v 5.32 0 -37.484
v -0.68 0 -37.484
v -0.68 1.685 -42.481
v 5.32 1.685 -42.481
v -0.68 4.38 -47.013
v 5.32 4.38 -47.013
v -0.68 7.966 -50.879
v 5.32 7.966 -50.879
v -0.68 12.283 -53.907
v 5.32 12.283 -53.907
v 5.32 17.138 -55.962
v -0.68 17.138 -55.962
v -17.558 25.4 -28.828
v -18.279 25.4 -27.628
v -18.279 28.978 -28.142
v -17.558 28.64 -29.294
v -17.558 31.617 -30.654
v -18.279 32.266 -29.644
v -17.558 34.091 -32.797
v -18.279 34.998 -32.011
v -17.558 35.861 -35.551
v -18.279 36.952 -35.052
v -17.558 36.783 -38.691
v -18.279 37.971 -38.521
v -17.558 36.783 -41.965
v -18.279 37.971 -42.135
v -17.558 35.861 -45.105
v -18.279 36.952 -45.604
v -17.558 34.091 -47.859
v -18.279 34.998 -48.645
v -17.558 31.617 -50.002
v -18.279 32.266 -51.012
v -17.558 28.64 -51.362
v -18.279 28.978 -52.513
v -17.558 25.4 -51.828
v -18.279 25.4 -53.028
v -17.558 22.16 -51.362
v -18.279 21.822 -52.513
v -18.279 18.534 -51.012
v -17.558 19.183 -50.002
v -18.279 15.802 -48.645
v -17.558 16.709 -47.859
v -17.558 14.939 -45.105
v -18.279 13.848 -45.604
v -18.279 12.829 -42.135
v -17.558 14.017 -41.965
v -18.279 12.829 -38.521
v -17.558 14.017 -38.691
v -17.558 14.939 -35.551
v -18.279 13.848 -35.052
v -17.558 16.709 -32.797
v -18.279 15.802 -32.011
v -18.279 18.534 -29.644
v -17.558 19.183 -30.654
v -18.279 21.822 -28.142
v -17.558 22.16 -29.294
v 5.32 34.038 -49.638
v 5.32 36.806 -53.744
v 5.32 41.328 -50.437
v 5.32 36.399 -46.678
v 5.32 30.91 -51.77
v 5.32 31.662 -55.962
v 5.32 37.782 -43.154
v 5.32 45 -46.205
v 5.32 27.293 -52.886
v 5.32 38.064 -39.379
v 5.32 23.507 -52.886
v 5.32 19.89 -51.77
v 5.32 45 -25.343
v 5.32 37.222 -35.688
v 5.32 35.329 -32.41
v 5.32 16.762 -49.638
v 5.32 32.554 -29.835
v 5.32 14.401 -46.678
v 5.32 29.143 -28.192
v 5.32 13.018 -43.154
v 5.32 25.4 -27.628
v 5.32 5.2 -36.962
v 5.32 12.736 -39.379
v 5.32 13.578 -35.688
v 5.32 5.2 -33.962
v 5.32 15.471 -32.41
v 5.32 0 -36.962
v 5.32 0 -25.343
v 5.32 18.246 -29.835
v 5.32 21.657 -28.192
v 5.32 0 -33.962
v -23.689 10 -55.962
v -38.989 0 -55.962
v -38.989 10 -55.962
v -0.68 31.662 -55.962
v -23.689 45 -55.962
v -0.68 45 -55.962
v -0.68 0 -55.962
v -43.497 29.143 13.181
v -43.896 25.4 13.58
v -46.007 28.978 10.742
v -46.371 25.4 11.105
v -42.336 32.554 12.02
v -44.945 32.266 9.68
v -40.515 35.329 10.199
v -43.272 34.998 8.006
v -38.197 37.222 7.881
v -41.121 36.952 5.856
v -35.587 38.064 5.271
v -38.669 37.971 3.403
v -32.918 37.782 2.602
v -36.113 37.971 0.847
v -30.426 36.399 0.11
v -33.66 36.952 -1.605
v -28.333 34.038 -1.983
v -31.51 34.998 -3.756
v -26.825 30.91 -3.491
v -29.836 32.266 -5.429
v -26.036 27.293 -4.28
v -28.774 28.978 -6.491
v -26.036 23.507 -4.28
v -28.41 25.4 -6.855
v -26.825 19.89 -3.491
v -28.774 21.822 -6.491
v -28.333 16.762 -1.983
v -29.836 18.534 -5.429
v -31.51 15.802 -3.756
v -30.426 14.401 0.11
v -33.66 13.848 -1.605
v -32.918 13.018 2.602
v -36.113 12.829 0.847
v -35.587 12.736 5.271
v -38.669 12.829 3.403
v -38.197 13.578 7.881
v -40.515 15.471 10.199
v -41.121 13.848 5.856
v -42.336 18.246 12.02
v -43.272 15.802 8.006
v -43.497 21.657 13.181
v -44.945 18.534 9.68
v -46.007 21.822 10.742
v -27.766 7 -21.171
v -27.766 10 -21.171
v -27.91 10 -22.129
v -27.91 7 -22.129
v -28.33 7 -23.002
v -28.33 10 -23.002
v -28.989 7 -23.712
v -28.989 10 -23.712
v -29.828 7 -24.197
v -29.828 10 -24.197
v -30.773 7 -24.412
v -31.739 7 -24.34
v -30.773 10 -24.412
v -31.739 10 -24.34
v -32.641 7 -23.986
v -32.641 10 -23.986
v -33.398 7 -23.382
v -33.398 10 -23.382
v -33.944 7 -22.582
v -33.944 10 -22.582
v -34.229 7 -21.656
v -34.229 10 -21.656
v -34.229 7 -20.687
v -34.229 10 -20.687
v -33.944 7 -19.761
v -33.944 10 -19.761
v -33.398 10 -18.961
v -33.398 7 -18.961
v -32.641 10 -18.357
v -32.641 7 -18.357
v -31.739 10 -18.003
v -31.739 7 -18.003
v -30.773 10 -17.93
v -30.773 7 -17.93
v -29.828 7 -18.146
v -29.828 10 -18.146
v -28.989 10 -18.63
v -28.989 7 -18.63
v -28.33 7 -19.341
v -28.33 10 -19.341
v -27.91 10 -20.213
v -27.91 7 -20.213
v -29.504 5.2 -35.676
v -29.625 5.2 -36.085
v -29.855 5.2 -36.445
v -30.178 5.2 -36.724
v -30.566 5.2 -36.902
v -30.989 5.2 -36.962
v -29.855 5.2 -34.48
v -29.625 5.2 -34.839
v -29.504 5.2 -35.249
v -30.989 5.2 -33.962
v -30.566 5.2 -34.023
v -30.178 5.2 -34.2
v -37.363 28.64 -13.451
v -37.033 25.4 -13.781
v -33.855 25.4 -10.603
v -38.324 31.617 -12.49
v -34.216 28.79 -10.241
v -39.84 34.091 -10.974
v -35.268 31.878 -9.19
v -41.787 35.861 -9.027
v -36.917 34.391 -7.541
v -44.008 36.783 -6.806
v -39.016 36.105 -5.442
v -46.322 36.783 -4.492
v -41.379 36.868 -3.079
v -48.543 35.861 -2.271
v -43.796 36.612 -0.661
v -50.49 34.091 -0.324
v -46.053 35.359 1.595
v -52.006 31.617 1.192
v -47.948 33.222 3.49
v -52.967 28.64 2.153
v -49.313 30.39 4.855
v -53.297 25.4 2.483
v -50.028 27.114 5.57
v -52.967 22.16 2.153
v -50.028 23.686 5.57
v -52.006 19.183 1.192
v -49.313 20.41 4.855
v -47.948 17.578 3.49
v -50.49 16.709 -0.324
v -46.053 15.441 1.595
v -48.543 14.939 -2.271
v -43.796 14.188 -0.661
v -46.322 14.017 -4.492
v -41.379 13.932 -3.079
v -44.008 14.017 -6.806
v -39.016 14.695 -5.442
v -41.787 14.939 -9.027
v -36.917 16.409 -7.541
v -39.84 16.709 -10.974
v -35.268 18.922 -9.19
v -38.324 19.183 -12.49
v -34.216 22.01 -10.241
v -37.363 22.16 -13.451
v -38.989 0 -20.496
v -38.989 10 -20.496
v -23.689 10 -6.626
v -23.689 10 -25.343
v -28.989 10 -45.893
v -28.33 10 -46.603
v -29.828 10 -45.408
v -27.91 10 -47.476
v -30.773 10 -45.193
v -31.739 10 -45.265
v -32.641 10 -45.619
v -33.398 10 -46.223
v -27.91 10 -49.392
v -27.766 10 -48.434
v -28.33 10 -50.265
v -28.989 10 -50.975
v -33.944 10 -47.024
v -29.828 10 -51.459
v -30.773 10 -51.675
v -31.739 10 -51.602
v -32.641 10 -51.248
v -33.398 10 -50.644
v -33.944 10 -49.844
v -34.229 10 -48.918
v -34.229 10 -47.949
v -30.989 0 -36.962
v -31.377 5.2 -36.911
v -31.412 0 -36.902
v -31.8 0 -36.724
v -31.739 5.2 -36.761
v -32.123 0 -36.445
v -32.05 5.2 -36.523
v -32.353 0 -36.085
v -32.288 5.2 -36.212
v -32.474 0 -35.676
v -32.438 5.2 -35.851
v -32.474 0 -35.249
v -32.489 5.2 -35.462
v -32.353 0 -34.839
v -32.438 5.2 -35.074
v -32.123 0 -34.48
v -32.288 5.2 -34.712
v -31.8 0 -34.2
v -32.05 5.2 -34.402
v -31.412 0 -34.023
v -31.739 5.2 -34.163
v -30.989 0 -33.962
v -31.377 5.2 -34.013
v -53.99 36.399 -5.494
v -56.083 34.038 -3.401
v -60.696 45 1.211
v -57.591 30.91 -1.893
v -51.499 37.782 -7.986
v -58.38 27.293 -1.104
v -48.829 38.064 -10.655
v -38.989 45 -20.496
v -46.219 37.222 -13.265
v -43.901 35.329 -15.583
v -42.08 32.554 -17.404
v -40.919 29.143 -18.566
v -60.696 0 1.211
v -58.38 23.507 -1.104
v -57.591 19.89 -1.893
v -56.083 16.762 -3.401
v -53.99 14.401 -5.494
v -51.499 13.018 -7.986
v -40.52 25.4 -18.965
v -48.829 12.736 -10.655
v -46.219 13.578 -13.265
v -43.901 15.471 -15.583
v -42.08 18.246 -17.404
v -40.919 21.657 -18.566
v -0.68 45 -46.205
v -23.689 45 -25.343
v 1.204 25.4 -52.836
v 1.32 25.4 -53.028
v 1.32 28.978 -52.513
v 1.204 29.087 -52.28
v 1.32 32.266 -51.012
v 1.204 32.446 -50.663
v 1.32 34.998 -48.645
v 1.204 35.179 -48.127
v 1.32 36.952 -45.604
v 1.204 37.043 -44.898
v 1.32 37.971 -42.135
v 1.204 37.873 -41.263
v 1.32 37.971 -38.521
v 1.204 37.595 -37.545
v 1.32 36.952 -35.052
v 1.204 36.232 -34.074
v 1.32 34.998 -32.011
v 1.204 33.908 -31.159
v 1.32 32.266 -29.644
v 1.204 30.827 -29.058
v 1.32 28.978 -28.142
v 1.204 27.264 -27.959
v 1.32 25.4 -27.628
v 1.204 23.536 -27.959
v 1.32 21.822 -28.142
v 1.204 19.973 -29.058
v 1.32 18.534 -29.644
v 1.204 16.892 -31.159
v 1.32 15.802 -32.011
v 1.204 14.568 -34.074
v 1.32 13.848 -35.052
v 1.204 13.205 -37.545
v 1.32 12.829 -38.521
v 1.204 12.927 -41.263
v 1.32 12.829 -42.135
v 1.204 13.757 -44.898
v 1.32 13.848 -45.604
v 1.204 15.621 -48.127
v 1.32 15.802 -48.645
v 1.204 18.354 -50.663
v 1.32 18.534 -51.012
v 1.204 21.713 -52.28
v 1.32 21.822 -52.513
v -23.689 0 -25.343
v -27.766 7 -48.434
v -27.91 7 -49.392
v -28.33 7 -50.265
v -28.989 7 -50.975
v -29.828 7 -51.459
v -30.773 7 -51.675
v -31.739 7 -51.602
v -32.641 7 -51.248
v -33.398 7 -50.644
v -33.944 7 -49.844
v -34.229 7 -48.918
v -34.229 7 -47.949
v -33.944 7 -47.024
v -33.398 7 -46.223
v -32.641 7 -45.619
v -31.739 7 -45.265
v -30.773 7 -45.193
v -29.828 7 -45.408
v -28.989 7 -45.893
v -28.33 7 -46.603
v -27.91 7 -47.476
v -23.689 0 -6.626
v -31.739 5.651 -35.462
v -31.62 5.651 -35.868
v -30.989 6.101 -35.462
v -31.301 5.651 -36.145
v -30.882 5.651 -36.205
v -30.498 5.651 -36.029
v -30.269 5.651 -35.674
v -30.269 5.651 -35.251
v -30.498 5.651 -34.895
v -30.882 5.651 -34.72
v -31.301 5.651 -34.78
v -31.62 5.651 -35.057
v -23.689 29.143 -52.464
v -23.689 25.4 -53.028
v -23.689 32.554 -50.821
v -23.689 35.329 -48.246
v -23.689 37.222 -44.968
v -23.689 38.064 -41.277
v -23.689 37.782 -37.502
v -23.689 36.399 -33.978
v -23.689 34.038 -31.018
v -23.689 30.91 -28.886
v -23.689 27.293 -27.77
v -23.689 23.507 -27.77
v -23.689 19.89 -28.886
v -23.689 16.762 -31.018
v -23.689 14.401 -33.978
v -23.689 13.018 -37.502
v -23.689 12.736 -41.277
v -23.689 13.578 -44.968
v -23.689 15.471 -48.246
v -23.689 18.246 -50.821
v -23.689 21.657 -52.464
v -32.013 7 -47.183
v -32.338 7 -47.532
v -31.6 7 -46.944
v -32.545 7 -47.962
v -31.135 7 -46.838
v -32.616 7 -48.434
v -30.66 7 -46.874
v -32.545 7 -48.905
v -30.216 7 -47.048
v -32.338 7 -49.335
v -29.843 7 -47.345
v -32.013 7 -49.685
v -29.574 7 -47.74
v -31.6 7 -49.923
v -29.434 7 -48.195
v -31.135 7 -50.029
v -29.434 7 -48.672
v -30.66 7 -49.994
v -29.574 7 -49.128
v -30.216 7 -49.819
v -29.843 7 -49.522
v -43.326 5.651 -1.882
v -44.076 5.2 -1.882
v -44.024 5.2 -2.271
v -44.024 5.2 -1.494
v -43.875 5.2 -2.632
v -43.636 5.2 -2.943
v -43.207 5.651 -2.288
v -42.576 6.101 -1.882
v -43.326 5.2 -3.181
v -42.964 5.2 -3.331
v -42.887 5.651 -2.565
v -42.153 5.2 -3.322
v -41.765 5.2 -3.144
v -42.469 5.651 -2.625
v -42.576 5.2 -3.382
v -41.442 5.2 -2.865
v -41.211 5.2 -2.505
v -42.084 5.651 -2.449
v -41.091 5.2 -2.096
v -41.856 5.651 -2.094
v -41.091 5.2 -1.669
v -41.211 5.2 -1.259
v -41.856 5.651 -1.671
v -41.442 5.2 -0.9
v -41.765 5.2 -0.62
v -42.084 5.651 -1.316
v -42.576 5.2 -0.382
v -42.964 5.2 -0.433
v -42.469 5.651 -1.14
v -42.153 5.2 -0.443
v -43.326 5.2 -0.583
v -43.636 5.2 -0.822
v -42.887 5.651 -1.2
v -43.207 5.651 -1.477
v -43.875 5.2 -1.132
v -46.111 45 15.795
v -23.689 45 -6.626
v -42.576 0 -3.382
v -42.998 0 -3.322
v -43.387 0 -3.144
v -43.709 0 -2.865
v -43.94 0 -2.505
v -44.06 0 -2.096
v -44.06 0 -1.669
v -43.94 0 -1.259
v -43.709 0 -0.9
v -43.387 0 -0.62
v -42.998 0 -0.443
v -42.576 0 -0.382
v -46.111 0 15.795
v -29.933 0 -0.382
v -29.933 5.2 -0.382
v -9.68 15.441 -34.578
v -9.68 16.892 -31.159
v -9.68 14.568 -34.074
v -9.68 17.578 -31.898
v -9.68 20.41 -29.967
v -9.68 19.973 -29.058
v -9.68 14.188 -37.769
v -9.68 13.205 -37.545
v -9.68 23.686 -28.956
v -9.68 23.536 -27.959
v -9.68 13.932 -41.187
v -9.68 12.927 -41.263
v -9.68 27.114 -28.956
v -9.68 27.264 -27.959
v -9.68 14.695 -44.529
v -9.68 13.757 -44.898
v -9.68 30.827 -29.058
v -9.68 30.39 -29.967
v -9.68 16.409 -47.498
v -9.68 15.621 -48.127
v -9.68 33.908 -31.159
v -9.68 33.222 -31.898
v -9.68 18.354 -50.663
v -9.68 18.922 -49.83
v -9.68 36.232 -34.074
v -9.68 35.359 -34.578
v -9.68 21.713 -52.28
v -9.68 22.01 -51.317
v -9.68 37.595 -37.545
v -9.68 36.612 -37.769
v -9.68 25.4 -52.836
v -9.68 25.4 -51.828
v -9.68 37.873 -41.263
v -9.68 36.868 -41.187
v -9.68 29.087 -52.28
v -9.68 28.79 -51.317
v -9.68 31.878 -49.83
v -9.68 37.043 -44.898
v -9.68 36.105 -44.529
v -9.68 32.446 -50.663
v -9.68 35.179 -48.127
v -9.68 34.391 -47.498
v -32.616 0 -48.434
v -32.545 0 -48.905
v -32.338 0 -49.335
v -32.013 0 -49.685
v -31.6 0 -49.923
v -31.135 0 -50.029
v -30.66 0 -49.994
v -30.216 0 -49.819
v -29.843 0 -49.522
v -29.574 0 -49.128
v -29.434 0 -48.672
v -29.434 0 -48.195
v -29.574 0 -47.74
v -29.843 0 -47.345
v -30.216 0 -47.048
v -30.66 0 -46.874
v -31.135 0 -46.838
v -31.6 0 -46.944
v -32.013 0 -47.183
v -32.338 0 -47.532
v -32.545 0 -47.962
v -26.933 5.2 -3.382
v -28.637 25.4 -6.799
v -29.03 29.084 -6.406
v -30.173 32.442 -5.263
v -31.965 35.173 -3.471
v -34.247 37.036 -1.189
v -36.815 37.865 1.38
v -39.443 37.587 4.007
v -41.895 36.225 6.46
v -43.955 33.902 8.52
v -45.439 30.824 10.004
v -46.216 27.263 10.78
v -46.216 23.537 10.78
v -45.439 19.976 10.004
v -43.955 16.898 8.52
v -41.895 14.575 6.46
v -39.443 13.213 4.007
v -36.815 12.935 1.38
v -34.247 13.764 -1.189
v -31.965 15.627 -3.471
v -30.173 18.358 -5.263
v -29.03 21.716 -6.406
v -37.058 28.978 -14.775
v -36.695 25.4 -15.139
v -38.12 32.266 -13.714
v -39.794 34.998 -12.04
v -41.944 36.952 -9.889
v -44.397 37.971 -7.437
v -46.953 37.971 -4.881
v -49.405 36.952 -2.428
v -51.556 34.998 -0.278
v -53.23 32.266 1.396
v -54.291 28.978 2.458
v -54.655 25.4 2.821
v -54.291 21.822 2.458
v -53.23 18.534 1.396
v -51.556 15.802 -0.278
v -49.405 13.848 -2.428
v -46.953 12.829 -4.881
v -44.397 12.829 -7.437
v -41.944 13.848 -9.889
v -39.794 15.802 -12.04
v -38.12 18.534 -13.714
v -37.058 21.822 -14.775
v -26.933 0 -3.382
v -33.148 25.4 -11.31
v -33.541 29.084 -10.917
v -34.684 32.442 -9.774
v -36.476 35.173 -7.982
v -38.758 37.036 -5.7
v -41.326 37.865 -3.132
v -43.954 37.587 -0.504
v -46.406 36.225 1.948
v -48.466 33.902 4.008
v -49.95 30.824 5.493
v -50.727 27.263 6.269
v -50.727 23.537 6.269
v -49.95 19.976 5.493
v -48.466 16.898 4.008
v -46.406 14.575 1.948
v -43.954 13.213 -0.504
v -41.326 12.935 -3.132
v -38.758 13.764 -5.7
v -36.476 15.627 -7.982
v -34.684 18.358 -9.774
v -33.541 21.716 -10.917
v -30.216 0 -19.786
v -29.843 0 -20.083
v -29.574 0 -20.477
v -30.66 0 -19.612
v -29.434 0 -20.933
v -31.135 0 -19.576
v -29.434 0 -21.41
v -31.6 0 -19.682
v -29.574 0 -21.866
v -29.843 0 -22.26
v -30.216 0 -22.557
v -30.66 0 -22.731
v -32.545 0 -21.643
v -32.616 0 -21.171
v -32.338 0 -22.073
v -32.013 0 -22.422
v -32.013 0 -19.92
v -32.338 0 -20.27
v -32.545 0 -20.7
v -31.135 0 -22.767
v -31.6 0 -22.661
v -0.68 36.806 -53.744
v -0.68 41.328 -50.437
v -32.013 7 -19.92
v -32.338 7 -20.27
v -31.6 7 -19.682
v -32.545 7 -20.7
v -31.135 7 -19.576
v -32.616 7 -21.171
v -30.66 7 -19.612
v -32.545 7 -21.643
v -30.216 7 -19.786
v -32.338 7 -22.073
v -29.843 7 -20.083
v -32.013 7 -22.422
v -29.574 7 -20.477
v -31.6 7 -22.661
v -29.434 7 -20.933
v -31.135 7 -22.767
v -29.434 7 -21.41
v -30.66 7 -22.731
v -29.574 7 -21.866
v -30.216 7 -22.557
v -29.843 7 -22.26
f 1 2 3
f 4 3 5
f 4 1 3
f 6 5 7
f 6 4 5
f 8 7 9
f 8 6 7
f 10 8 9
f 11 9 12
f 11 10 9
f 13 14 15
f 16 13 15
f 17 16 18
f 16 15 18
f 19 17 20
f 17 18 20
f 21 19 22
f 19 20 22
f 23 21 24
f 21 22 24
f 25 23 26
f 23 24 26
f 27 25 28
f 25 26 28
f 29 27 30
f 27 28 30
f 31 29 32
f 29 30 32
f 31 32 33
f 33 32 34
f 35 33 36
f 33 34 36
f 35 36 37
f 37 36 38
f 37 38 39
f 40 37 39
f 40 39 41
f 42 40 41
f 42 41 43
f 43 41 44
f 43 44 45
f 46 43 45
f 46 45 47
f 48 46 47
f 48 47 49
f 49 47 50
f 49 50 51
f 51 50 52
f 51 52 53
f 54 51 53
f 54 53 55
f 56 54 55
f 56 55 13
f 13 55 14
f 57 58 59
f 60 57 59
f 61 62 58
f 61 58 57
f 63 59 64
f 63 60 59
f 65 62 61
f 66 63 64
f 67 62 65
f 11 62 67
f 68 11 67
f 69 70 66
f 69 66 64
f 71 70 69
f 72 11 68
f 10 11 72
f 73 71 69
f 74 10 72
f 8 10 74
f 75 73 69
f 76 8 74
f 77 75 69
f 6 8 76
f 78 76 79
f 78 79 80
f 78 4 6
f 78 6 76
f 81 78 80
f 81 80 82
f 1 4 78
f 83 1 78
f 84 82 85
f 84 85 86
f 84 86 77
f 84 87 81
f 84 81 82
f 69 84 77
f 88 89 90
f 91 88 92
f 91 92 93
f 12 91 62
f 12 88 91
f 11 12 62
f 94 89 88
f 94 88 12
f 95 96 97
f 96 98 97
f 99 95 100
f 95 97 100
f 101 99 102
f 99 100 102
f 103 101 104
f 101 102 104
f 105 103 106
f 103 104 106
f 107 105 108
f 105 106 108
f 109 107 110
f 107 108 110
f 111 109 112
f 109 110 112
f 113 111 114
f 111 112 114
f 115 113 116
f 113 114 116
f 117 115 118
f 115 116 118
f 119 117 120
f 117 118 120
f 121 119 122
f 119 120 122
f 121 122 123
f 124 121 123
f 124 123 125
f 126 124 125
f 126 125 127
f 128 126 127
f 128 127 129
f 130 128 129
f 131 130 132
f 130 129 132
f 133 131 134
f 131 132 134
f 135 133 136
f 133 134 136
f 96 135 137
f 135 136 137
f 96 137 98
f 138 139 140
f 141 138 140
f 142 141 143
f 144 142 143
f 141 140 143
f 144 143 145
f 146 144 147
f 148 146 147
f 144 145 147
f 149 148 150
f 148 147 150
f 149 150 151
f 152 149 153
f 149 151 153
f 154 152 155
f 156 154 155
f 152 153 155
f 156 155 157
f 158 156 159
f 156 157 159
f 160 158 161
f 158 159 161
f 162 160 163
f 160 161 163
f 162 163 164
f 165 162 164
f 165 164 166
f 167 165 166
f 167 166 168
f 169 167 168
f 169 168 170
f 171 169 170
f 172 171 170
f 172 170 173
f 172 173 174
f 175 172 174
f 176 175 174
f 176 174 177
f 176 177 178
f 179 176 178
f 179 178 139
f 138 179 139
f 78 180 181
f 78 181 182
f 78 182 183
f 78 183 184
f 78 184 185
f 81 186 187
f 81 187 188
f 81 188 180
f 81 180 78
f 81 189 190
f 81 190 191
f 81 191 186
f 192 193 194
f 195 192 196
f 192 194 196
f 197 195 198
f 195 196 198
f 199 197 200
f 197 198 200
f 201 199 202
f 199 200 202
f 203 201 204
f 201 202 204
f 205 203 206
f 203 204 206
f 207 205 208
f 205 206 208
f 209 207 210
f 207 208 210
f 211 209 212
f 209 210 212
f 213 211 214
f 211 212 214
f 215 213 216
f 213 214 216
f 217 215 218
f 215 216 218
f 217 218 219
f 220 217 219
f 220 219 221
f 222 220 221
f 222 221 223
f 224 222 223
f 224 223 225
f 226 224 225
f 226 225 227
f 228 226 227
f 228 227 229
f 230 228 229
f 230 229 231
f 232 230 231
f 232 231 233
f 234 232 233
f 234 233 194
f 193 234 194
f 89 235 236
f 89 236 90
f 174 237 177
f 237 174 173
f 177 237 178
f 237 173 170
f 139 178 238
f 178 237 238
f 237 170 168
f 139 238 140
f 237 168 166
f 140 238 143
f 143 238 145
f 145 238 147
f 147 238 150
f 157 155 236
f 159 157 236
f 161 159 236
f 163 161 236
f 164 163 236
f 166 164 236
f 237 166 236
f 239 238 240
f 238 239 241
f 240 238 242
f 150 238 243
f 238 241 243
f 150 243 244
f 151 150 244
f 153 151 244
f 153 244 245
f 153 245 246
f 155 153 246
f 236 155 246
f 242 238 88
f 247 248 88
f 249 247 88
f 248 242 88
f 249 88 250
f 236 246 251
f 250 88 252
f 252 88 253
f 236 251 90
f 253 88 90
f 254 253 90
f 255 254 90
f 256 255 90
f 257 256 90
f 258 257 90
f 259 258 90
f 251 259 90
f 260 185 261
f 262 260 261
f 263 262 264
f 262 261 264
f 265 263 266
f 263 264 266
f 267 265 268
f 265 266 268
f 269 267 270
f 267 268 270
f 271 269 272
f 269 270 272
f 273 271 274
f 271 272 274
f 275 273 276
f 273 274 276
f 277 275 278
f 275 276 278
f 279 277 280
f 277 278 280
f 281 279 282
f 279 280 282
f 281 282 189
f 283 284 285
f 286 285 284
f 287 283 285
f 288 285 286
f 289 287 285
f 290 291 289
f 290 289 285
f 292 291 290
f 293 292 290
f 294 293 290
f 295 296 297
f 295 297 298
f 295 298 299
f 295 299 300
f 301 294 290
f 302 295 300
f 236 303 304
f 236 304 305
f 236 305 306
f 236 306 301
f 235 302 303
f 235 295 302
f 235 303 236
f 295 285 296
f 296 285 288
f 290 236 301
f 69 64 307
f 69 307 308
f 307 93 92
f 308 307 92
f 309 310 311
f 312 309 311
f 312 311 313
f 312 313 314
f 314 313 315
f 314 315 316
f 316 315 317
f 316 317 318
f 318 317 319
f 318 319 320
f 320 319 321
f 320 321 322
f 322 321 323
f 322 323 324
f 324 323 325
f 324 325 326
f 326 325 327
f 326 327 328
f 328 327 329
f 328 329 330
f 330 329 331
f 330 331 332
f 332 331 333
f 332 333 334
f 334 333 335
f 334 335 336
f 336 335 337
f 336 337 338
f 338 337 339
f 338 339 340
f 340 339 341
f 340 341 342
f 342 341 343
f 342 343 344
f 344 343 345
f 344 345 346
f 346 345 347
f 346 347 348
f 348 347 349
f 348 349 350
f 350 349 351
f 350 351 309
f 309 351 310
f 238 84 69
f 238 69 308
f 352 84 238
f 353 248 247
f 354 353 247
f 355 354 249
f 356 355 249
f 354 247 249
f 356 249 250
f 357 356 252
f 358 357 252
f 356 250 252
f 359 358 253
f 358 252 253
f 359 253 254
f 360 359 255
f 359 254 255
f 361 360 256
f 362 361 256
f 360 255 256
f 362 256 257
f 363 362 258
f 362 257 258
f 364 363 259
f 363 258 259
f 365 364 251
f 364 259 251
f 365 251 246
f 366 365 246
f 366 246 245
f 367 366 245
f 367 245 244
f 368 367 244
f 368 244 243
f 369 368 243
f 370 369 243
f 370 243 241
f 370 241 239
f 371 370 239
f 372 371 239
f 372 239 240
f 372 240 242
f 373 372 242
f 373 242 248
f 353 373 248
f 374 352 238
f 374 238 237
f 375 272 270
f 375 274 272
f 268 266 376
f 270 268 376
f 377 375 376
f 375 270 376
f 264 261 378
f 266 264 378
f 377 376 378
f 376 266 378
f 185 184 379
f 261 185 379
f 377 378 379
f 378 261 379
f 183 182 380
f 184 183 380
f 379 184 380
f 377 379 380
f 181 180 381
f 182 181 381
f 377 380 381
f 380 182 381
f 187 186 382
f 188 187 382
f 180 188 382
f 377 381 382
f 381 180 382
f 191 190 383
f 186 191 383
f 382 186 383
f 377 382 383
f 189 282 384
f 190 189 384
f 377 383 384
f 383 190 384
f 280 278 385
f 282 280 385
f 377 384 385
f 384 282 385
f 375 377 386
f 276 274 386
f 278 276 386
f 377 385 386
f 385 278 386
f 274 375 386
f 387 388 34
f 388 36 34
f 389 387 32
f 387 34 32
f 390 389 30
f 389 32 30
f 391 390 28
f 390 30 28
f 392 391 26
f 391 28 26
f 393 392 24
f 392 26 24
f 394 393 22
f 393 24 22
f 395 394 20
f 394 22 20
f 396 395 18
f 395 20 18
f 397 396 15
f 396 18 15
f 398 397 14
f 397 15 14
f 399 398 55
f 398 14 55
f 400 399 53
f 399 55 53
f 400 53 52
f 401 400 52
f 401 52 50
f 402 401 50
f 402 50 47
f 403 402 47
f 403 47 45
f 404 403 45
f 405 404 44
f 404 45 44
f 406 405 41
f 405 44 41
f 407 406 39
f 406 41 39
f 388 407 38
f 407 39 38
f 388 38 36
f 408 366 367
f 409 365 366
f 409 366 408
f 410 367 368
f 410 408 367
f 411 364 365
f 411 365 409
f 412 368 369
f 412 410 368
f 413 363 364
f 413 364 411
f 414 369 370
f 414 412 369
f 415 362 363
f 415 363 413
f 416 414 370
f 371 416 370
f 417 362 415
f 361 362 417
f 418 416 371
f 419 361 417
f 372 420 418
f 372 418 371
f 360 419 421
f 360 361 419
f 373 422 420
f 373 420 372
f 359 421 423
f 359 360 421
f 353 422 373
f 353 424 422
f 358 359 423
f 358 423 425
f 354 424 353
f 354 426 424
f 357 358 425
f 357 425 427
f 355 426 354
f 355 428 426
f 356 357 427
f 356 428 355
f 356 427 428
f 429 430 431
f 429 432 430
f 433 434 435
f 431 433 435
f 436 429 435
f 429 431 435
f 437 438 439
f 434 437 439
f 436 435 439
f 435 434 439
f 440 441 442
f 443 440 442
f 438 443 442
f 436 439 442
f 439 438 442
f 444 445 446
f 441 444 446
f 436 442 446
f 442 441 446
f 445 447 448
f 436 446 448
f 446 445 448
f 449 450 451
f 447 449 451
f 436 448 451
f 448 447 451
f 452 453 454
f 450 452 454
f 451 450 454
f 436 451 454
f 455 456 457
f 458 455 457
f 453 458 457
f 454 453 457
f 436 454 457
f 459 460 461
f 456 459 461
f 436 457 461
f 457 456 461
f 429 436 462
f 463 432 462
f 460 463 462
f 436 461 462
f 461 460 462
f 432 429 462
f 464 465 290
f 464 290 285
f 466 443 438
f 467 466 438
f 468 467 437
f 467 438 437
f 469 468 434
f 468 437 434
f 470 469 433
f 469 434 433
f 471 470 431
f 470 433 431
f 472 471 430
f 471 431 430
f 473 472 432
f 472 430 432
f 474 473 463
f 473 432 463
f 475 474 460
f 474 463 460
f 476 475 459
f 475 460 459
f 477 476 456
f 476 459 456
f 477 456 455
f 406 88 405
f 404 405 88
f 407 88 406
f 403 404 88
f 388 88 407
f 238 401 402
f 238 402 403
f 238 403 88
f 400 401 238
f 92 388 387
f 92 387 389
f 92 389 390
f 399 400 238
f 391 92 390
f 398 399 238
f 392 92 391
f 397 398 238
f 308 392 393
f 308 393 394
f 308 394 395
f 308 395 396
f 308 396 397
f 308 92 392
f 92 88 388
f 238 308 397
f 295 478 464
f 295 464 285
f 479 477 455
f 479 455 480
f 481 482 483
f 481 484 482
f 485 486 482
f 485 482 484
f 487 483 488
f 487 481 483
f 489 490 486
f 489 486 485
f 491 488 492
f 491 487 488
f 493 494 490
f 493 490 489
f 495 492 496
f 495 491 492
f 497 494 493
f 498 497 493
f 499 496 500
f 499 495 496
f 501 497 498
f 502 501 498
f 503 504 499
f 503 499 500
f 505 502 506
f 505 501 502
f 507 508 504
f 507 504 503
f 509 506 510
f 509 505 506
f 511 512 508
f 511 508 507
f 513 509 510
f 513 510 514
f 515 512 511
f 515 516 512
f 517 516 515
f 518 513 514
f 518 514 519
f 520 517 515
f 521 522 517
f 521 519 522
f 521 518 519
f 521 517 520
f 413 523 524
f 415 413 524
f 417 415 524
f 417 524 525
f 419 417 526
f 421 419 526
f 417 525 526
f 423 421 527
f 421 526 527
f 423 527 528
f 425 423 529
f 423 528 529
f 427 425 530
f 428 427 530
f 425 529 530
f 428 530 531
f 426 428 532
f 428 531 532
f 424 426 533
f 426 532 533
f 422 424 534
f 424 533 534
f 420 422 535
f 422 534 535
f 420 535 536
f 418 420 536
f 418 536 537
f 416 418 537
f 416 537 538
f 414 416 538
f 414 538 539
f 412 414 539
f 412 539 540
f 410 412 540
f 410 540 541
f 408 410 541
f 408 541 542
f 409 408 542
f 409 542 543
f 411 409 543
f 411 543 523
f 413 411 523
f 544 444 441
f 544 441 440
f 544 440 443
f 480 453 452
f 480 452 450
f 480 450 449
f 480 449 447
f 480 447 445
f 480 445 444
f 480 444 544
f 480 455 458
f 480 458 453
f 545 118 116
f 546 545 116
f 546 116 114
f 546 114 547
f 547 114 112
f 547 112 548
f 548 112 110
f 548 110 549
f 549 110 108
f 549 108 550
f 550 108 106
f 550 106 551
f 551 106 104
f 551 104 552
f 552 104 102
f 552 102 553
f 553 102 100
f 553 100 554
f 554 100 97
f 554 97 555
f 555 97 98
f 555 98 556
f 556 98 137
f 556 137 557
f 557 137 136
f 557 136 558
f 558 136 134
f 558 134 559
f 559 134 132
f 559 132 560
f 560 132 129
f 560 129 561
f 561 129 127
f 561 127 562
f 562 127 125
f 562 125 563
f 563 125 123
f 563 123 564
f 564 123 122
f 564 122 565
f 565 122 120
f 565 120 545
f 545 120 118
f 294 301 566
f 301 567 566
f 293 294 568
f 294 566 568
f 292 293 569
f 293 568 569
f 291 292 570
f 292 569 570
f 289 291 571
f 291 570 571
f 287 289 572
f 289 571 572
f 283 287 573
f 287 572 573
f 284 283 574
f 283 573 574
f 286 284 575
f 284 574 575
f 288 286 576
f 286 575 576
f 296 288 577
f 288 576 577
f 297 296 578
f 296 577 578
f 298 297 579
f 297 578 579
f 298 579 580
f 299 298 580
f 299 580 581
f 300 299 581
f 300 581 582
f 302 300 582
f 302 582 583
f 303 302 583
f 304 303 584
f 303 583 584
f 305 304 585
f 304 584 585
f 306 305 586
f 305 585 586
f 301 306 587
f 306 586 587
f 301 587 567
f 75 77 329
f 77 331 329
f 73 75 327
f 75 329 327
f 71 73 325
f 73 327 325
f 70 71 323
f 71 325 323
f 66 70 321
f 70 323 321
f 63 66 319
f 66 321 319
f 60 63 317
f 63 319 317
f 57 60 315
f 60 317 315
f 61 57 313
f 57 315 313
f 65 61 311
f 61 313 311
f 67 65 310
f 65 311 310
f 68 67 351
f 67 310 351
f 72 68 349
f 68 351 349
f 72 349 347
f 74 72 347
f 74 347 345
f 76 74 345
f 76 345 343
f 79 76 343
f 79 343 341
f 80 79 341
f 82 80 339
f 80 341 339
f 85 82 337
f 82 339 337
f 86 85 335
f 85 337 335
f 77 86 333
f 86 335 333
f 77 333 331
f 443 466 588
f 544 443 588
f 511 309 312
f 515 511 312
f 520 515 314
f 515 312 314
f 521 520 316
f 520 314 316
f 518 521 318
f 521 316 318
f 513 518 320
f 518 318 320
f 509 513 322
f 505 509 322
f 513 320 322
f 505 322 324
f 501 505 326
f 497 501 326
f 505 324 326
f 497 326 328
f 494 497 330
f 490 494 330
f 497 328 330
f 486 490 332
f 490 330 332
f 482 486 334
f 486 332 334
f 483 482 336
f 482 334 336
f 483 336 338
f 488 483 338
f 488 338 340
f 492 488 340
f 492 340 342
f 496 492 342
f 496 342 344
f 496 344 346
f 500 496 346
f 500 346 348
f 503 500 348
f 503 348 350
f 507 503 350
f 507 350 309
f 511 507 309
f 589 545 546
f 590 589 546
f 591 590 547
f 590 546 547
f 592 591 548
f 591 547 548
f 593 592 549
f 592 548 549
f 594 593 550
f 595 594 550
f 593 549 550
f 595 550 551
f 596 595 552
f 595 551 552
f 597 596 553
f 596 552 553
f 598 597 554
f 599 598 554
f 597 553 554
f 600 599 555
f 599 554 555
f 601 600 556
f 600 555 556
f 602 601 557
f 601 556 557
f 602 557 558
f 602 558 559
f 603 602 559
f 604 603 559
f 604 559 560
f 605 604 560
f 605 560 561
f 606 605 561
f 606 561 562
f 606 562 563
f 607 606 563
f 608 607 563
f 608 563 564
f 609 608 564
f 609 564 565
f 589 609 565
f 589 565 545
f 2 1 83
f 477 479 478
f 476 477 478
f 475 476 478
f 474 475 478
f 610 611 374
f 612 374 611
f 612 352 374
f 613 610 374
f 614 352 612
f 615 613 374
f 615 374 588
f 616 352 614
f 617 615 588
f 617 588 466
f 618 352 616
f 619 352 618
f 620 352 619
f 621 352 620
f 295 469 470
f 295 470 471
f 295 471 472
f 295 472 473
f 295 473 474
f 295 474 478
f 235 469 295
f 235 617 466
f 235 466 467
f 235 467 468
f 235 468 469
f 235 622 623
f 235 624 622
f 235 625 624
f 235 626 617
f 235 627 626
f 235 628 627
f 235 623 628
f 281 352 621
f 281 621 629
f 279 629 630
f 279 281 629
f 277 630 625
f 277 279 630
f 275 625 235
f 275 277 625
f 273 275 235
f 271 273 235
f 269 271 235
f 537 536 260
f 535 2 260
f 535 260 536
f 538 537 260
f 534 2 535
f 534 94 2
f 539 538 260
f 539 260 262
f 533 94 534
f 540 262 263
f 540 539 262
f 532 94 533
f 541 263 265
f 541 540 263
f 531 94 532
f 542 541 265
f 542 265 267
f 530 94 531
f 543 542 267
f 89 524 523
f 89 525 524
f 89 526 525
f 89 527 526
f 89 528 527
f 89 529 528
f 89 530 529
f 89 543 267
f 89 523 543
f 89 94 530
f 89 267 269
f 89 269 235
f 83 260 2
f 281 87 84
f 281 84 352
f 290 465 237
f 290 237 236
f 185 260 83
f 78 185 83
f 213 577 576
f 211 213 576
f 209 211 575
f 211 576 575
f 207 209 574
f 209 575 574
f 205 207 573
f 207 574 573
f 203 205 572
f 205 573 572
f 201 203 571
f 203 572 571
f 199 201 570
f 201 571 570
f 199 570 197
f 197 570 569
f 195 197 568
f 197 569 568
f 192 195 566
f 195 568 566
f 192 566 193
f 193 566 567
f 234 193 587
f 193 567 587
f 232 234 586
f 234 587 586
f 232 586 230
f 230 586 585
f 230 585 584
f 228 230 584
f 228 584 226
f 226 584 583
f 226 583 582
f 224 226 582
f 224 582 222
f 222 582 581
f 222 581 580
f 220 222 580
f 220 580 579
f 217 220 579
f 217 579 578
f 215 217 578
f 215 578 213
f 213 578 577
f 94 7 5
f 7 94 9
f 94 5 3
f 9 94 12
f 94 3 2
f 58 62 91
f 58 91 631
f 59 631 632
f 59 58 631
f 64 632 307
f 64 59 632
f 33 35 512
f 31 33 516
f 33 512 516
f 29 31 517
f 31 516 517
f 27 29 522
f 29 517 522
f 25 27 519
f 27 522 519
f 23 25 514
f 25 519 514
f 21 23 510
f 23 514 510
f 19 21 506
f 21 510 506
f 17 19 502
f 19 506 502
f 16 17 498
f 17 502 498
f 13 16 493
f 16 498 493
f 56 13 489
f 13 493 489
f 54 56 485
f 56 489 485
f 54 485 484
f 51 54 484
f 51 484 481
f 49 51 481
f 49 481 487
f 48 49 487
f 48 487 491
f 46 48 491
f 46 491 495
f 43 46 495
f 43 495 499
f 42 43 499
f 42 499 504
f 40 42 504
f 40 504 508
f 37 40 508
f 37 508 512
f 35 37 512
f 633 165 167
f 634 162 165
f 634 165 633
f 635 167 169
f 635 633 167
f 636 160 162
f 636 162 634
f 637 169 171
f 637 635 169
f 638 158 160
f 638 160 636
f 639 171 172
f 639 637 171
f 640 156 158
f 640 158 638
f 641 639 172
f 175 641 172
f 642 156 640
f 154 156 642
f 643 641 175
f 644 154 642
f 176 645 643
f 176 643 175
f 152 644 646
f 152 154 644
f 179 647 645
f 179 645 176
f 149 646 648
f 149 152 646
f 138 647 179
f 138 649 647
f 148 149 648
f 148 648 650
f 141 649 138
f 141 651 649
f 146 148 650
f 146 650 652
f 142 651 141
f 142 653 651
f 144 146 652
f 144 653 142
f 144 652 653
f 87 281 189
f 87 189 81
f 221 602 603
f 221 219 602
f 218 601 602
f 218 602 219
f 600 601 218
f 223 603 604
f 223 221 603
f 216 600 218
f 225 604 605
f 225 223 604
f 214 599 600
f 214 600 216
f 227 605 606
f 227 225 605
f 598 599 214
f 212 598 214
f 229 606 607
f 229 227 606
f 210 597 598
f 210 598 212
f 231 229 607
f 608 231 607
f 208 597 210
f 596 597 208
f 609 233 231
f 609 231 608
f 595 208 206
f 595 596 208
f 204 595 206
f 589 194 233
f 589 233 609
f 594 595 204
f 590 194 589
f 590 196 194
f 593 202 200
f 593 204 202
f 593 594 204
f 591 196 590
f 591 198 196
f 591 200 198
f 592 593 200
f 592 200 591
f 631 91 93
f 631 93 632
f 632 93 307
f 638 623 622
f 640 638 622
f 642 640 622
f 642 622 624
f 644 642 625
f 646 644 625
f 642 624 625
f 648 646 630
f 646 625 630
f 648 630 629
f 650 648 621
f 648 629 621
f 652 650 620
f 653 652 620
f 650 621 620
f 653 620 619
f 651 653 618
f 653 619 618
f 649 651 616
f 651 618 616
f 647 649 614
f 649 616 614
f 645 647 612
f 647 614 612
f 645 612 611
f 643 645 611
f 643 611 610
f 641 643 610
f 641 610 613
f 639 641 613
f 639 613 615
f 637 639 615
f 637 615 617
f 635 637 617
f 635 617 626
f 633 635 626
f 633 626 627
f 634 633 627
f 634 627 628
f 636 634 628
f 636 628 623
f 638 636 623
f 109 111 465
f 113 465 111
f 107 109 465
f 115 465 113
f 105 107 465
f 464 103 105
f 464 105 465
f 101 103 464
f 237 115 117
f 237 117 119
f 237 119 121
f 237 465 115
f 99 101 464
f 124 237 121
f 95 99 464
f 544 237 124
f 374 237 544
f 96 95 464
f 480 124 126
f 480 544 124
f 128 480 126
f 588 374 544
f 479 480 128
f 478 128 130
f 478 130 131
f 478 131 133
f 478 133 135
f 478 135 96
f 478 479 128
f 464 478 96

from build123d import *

# Parameters (mm, degrees)
BOSS_EXTRUDE1_DEPTH            = 45
SKETCH2_R                      = 12.5
CUT_EXTRUDE1_DEPTH             = 10
SKETCH3_R                      = 12.508139694
CUT_EXTRUDE2_DEPTH             = 15
CUT_EXTRUDE3_REACH             = 53.053
SKETCH4_R                      = 11.5
CUT_EXTRUDE4_REACH             = 53.015
SKETCH5_R                      = 11.5
SM1_TAPPED_HOLE1_D             = 25.4
SM1_TAPPED_HOLE1_DEPTH         = 4
SM1_TAPPED_HOLE1_TIP           = 7.630929862
SM1_TAPPED_HOLE2_D             = 25.4
SM1_TAPPED_HOLE2_DEPTH         = 3.5
SM1_TAPPED_HOLE2_TIP           = 7.630929862
CUT_EXTRUDE5_DEPTH             = 35
SM1_TAPPED_HOLE3_D             = 25.4
SM1_TAPPED_HOLE3_DEPTH         = 5.41
SM1_TAPPED_HOLE3_TIP           = 7.630929862
SM1_TAPPED_HOLE4_D             = 25.4
SM1_TAPPED_HOLE4_DEPTH         = 5.41
SM1_TAPPED_HOLE4_TIP           = 7.630929862
CBORE_FOR_M3_SHCS1_D           = 3.2
CBORE_FOR_M3_SHCS1_DEPTH       = 10
CBORE_FOR_M3_SHCS1_CBORE_D     = 6.5
CBORE_FOR_M3_SHCS1_CBORE_DEPTH = 3
CUT_EXTRUDE6_START             = -5.339235
CUT_EXTRUDE6_DEPTH             = 6
F_3_0MM_DOWEL_HOLE1_D          = 3
F_3_0MM_DOWEL_HOLE1_DEPTH      = 5.2
F_3_0MM_DOWEL_HOLE1_TIP        = 0.901290929
SKETCH21_W                     = 17.451379617
SKETCH21_H                     = 3
SKETCH21_W_2                   = 37.142162435
CUT_EXTRUDE7_DEPTH             = 5.2


with BuildPart() as part:
    # Sketch1 → Boss-Extrude1 (new body)
    with BuildSketch(Plane(origin=(0, 0, 0), x_dir=(1, 0, 0), z_dir=(0, 1, 0))):
        Polygon((5.319745859, 25.342678723), (-23.689372123, 25.342678723), (-23.689372123, 6.626389833), (-46.111095982, -15.795334027), (-60.695537468, -1.210892541), (-38.989042082, 20.495602845), (-38.989042082, 55.962281461), (5.319745859, 55.962281461), align=None)
    extrude(amount=BOSS_EXTRUDE1_DEPTH)

    # Sketch2 → Cut-Extrude1 (cut)
    with BuildSketch(Plane(origin=(-15.157880978, 0, -15.157880978), x_dir=(0.707106781, 0, -0.707106781), z_dir=(0.707106781, 0, 0.707106781))):
        with Locations((-27.941994438, 25.4)):
            Circle(SKETCH2_R)
    extrude(amount=-CUT_EXTRUDE1_DEPTH, mode=Mode.SUBTRACT)

    # Sketch3 → Cut-Extrude2 (cut)
    with BuildSketch(Plane(origin=(5.319745859, 0, 0), x_dir=(0, 0, -1), z_dir=(1, 0, 0))):
        with Locations((40.327918955, 25.4)):
            Circle(SKETCH3_R)
    extrude(amount=-CUT_EXTRUDE2_DEPTH, mode=Mode.SUBTRACT)

    # Sketch4 → Cut-Extrude3 (cut, up to next)
    with BuildSketch(Plane(origin=(-22.228948789, 0, -22.228948789), x_dir=(0.707106781, 0, -0.707106781), z_dir=(0.707106781, 0, 0.707106781)), mode=Mode.PRIVATE) as cut_extrude3_sk1:
        with Locations((-27.941994438, 25.4)):
            Circle(SKETCH4_R)
    cut_extrude3_tool1 = extrude(cut_extrude3_sk1.sketch, amount=-CUT_EXTRUDE3_REACH, mode=Mode.PRIVATE) & part.part
    add(cut_extrude3_tool1.solids().sort_by_distance((-41.986923, 25.4, -2.470975))[0], mode=Mode.SUBTRACT)

    # Sketch5 → Cut-Extrude4 (cut, up to next)
    with BuildSketch(Plane(origin=(-9.680254141, 0, 0), x_dir=(0, 0, -1), z_dir=(1, 0, 0)), mode=Mode.PRIVATE) as cut_extrude4_sk1:
        with Locations((40.327918955, 25.4)):
            Circle(SKETCH5_R)
    cut_extrude4_tool1 = extrude(cut_extrude4_sk1.sketch, amount=-CUT_EXTRUDE4_REACH, mode=Mode.PRIVATE) & part.part
    add(cut_extrude4_tool1.solids().sort_by_distance((-9.680254, 25.4, -40.327919))[0], mode=Mode.SUBTRACT)

    # SM1 Tapped Hole1
    with Locations(Plane(origin=(5.319745859, 0, 0), x_dir=(0, 0, -1), z_dir=(1, 0, 0))):
        with Locations((40.327918955, 25.4)):
            Hole(SM1_TAPPED_HOLE1_D / 2, depth=SM1_TAPPED_HOLE1_DEPTH)
            with Locations((0, 0, -(SM1_TAPPED_HOLE1_DEPTH + SM1_TAPPED_HOLE1_TIP / 2))):  # 118° drill point
                Cone(0, SM1_TAPPED_HOLE1_D / 2, SM1_TAPPED_HOLE1_TIP, mode=Mode.SUBTRACT)

    # SM1 Tapped Hole2
    with Locations(Plane(origin=(-15.157880978, 0, -15.157880978), x_dir=(0.707106781, 0, -0.707106781), z_dir=(0.707106781, 0, 0.707106781))):
        with Locations((-27.941994438, 25.4)):
            Hole(SM1_TAPPED_HOLE2_D / 2, depth=SM1_TAPPED_HOLE2_DEPTH)
            with Locations((0, 0, -(SM1_TAPPED_HOLE2_DEPTH + SM1_TAPPED_HOLE2_TIP / 2))):  # 118° drill point
                Cone(0, SM1_TAPPED_HOLE2_D / 2, SM1_TAPPED_HOLE2_TIP, mode=Mode.SUBTRACT)

    # Sketch11 → Cut-Extrude5 (cut)
    with BuildSketch(Plane(origin=(0, 45, 0), x_dir=(1, 0, 0), z_dir=(0, 1, 0))):
        Polygon((-23.689372123, 6.626389833), (-38.989042082, 20.495602845), (-38.989042082, 55.962281461), (-23.689372123, 55.962281461), align=None)
    extrude(amount=-CUT_EXTRUDE5_DEPTH, mode=Mode.SUBTRACT)

    # SM1 Tapped Hole3
    with Locations(Plane.ZY.offset(23.689372123)):
        with Locations((-40.327918955, 25.4)):
            Hole(SM1_TAPPED_HOLE3_D / 2, depth=SM1_TAPPED_HOLE3_DEPTH)
            with Locations((0, 0, -(SM1_TAPPED_HOLE3_DEPTH + SM1_TAPPED_HOLE3_TIP / 2))):  # 118° drill point
                Cone(0, SM1_TAPPED_HOLE3_D / 2, SM1_TAPPED_HOLE3_TIP, mode=Mode.SUBTRACT)

    # SM1 Tapped Hole4
    with Locations(Plane(origin=(-29.742322464, 0, -29.742322464), x_dir=(-0.707106781, 0, 0.707106781), z_dir=(-0.707106781, 0, -0.707106781))):
        with Locations((27.941994438, 25.4)):
            Hole(SM1_TAPPED_HOLE4_D / 2, depth=SM1_TAPPED_HOLE4_DEPTH)
            with Locations((0, 0, -(SM1_TAPPED_HOLE4_DEPTH + SM1_TAPPED_HOLE4_TIP / 2))):  # 118° drill point
                Cone(0, SM1_TAPPED_HOLE4_D / 2, SM1_TAPPED_HOLE4_TIP, mode=Mode.SUBTRACT)

    # CBORE for M3 SHCS1
    with Locations(Plane(origin=(0, 10, 0), x_dir=(1, 0, 0), z_dir=(0, 1, 0))):
        with Locations((-31.01569247, 48.433741468), (-31.01569247, 21.171407243)):
            CounterBoreHole(CBORE_FOR_M3_SHCS1_D / 2, CBORE_FOR_M3_SHCS1_CBORE_D / 2, CBORE_FOR_M3_SHCS1_CBORE_DEPTH, depth=CBORE_FOR_M3_SHCS1_DEPTH)

    # Sketch18 → Cut-Extrude6 (cut)
    with BuildSketch(Plane.ZY.offset(0.01948891).offset(CUT_EXTRUDE6_START)):
        with BuildLine():
            Line((-46.204849494, 45), (-56.766756342, 45))
            Line((-56.766756342, 45), (-56.766756342, 28.086826547))
            ThreePointArc((-56.766756342, 28.086826547), (-53.24503426, 37.642014764), (-46.204849494, 45))
        make_face()
        with BuildLine():
            Line((-56.619620621, 19.834105942), (-56.619620621, 0))
            Line((-56.619620621, 0), (-37.484367562, 0))
            ThreePointArc((-37.484367562, 0), (-50.031901767, 7.042142066), (-56.619620621, 19.834105942))
        make_face()
    extrude(amount=CUT_EXTRUDE6_DEPTH, mode=Mode.SUBTRACT)

    # Ø3.0mm Dowel Hole1
    with Locations(Plane(origin=(0, 0, 0), x_dir=(-1, 0, 0), z_dir=(0, -1, 0))):
        with Locations((42.575562076, 1.882335503), (30.989042082, 35.462281461)):
            Hole(F_3_0MM_DOWEL_HOLE1_D / 2, depth=F_3_0MM_DOWEL_HOLE1_DEPTH)
            with Locations((0, 0, -(F_3_0MM_DOWEL_HOLE1_DEPTH + F_3_0MM_DOWEL_HOLE1_TIP / 2))):  # 118° drill point
                Cone(0, F_3_0MM_DOWEL_HOLE1_D / 2, F_3_0MM_DOWEL_HOLE1_TIP, mode=Mode.SUBTRACT)

    # Sketch21 → Cut-Extrude7 (cut)
    with BuildSketch(Plane.XZ):
        with Locations((-33.849872268, -1.882335503)):
            Rectangle(SKETCH21_W, SKETCH21_H)
        with Locations((-12.417960864, -35.462281461)):
            Rectangle(SKETCH21_W_2, SKETCH21_H)
    extrude(amount=-CUT_EXTRUDE7_DEPTH, mode=Mode.SUBTRACT)


solid = part.part
